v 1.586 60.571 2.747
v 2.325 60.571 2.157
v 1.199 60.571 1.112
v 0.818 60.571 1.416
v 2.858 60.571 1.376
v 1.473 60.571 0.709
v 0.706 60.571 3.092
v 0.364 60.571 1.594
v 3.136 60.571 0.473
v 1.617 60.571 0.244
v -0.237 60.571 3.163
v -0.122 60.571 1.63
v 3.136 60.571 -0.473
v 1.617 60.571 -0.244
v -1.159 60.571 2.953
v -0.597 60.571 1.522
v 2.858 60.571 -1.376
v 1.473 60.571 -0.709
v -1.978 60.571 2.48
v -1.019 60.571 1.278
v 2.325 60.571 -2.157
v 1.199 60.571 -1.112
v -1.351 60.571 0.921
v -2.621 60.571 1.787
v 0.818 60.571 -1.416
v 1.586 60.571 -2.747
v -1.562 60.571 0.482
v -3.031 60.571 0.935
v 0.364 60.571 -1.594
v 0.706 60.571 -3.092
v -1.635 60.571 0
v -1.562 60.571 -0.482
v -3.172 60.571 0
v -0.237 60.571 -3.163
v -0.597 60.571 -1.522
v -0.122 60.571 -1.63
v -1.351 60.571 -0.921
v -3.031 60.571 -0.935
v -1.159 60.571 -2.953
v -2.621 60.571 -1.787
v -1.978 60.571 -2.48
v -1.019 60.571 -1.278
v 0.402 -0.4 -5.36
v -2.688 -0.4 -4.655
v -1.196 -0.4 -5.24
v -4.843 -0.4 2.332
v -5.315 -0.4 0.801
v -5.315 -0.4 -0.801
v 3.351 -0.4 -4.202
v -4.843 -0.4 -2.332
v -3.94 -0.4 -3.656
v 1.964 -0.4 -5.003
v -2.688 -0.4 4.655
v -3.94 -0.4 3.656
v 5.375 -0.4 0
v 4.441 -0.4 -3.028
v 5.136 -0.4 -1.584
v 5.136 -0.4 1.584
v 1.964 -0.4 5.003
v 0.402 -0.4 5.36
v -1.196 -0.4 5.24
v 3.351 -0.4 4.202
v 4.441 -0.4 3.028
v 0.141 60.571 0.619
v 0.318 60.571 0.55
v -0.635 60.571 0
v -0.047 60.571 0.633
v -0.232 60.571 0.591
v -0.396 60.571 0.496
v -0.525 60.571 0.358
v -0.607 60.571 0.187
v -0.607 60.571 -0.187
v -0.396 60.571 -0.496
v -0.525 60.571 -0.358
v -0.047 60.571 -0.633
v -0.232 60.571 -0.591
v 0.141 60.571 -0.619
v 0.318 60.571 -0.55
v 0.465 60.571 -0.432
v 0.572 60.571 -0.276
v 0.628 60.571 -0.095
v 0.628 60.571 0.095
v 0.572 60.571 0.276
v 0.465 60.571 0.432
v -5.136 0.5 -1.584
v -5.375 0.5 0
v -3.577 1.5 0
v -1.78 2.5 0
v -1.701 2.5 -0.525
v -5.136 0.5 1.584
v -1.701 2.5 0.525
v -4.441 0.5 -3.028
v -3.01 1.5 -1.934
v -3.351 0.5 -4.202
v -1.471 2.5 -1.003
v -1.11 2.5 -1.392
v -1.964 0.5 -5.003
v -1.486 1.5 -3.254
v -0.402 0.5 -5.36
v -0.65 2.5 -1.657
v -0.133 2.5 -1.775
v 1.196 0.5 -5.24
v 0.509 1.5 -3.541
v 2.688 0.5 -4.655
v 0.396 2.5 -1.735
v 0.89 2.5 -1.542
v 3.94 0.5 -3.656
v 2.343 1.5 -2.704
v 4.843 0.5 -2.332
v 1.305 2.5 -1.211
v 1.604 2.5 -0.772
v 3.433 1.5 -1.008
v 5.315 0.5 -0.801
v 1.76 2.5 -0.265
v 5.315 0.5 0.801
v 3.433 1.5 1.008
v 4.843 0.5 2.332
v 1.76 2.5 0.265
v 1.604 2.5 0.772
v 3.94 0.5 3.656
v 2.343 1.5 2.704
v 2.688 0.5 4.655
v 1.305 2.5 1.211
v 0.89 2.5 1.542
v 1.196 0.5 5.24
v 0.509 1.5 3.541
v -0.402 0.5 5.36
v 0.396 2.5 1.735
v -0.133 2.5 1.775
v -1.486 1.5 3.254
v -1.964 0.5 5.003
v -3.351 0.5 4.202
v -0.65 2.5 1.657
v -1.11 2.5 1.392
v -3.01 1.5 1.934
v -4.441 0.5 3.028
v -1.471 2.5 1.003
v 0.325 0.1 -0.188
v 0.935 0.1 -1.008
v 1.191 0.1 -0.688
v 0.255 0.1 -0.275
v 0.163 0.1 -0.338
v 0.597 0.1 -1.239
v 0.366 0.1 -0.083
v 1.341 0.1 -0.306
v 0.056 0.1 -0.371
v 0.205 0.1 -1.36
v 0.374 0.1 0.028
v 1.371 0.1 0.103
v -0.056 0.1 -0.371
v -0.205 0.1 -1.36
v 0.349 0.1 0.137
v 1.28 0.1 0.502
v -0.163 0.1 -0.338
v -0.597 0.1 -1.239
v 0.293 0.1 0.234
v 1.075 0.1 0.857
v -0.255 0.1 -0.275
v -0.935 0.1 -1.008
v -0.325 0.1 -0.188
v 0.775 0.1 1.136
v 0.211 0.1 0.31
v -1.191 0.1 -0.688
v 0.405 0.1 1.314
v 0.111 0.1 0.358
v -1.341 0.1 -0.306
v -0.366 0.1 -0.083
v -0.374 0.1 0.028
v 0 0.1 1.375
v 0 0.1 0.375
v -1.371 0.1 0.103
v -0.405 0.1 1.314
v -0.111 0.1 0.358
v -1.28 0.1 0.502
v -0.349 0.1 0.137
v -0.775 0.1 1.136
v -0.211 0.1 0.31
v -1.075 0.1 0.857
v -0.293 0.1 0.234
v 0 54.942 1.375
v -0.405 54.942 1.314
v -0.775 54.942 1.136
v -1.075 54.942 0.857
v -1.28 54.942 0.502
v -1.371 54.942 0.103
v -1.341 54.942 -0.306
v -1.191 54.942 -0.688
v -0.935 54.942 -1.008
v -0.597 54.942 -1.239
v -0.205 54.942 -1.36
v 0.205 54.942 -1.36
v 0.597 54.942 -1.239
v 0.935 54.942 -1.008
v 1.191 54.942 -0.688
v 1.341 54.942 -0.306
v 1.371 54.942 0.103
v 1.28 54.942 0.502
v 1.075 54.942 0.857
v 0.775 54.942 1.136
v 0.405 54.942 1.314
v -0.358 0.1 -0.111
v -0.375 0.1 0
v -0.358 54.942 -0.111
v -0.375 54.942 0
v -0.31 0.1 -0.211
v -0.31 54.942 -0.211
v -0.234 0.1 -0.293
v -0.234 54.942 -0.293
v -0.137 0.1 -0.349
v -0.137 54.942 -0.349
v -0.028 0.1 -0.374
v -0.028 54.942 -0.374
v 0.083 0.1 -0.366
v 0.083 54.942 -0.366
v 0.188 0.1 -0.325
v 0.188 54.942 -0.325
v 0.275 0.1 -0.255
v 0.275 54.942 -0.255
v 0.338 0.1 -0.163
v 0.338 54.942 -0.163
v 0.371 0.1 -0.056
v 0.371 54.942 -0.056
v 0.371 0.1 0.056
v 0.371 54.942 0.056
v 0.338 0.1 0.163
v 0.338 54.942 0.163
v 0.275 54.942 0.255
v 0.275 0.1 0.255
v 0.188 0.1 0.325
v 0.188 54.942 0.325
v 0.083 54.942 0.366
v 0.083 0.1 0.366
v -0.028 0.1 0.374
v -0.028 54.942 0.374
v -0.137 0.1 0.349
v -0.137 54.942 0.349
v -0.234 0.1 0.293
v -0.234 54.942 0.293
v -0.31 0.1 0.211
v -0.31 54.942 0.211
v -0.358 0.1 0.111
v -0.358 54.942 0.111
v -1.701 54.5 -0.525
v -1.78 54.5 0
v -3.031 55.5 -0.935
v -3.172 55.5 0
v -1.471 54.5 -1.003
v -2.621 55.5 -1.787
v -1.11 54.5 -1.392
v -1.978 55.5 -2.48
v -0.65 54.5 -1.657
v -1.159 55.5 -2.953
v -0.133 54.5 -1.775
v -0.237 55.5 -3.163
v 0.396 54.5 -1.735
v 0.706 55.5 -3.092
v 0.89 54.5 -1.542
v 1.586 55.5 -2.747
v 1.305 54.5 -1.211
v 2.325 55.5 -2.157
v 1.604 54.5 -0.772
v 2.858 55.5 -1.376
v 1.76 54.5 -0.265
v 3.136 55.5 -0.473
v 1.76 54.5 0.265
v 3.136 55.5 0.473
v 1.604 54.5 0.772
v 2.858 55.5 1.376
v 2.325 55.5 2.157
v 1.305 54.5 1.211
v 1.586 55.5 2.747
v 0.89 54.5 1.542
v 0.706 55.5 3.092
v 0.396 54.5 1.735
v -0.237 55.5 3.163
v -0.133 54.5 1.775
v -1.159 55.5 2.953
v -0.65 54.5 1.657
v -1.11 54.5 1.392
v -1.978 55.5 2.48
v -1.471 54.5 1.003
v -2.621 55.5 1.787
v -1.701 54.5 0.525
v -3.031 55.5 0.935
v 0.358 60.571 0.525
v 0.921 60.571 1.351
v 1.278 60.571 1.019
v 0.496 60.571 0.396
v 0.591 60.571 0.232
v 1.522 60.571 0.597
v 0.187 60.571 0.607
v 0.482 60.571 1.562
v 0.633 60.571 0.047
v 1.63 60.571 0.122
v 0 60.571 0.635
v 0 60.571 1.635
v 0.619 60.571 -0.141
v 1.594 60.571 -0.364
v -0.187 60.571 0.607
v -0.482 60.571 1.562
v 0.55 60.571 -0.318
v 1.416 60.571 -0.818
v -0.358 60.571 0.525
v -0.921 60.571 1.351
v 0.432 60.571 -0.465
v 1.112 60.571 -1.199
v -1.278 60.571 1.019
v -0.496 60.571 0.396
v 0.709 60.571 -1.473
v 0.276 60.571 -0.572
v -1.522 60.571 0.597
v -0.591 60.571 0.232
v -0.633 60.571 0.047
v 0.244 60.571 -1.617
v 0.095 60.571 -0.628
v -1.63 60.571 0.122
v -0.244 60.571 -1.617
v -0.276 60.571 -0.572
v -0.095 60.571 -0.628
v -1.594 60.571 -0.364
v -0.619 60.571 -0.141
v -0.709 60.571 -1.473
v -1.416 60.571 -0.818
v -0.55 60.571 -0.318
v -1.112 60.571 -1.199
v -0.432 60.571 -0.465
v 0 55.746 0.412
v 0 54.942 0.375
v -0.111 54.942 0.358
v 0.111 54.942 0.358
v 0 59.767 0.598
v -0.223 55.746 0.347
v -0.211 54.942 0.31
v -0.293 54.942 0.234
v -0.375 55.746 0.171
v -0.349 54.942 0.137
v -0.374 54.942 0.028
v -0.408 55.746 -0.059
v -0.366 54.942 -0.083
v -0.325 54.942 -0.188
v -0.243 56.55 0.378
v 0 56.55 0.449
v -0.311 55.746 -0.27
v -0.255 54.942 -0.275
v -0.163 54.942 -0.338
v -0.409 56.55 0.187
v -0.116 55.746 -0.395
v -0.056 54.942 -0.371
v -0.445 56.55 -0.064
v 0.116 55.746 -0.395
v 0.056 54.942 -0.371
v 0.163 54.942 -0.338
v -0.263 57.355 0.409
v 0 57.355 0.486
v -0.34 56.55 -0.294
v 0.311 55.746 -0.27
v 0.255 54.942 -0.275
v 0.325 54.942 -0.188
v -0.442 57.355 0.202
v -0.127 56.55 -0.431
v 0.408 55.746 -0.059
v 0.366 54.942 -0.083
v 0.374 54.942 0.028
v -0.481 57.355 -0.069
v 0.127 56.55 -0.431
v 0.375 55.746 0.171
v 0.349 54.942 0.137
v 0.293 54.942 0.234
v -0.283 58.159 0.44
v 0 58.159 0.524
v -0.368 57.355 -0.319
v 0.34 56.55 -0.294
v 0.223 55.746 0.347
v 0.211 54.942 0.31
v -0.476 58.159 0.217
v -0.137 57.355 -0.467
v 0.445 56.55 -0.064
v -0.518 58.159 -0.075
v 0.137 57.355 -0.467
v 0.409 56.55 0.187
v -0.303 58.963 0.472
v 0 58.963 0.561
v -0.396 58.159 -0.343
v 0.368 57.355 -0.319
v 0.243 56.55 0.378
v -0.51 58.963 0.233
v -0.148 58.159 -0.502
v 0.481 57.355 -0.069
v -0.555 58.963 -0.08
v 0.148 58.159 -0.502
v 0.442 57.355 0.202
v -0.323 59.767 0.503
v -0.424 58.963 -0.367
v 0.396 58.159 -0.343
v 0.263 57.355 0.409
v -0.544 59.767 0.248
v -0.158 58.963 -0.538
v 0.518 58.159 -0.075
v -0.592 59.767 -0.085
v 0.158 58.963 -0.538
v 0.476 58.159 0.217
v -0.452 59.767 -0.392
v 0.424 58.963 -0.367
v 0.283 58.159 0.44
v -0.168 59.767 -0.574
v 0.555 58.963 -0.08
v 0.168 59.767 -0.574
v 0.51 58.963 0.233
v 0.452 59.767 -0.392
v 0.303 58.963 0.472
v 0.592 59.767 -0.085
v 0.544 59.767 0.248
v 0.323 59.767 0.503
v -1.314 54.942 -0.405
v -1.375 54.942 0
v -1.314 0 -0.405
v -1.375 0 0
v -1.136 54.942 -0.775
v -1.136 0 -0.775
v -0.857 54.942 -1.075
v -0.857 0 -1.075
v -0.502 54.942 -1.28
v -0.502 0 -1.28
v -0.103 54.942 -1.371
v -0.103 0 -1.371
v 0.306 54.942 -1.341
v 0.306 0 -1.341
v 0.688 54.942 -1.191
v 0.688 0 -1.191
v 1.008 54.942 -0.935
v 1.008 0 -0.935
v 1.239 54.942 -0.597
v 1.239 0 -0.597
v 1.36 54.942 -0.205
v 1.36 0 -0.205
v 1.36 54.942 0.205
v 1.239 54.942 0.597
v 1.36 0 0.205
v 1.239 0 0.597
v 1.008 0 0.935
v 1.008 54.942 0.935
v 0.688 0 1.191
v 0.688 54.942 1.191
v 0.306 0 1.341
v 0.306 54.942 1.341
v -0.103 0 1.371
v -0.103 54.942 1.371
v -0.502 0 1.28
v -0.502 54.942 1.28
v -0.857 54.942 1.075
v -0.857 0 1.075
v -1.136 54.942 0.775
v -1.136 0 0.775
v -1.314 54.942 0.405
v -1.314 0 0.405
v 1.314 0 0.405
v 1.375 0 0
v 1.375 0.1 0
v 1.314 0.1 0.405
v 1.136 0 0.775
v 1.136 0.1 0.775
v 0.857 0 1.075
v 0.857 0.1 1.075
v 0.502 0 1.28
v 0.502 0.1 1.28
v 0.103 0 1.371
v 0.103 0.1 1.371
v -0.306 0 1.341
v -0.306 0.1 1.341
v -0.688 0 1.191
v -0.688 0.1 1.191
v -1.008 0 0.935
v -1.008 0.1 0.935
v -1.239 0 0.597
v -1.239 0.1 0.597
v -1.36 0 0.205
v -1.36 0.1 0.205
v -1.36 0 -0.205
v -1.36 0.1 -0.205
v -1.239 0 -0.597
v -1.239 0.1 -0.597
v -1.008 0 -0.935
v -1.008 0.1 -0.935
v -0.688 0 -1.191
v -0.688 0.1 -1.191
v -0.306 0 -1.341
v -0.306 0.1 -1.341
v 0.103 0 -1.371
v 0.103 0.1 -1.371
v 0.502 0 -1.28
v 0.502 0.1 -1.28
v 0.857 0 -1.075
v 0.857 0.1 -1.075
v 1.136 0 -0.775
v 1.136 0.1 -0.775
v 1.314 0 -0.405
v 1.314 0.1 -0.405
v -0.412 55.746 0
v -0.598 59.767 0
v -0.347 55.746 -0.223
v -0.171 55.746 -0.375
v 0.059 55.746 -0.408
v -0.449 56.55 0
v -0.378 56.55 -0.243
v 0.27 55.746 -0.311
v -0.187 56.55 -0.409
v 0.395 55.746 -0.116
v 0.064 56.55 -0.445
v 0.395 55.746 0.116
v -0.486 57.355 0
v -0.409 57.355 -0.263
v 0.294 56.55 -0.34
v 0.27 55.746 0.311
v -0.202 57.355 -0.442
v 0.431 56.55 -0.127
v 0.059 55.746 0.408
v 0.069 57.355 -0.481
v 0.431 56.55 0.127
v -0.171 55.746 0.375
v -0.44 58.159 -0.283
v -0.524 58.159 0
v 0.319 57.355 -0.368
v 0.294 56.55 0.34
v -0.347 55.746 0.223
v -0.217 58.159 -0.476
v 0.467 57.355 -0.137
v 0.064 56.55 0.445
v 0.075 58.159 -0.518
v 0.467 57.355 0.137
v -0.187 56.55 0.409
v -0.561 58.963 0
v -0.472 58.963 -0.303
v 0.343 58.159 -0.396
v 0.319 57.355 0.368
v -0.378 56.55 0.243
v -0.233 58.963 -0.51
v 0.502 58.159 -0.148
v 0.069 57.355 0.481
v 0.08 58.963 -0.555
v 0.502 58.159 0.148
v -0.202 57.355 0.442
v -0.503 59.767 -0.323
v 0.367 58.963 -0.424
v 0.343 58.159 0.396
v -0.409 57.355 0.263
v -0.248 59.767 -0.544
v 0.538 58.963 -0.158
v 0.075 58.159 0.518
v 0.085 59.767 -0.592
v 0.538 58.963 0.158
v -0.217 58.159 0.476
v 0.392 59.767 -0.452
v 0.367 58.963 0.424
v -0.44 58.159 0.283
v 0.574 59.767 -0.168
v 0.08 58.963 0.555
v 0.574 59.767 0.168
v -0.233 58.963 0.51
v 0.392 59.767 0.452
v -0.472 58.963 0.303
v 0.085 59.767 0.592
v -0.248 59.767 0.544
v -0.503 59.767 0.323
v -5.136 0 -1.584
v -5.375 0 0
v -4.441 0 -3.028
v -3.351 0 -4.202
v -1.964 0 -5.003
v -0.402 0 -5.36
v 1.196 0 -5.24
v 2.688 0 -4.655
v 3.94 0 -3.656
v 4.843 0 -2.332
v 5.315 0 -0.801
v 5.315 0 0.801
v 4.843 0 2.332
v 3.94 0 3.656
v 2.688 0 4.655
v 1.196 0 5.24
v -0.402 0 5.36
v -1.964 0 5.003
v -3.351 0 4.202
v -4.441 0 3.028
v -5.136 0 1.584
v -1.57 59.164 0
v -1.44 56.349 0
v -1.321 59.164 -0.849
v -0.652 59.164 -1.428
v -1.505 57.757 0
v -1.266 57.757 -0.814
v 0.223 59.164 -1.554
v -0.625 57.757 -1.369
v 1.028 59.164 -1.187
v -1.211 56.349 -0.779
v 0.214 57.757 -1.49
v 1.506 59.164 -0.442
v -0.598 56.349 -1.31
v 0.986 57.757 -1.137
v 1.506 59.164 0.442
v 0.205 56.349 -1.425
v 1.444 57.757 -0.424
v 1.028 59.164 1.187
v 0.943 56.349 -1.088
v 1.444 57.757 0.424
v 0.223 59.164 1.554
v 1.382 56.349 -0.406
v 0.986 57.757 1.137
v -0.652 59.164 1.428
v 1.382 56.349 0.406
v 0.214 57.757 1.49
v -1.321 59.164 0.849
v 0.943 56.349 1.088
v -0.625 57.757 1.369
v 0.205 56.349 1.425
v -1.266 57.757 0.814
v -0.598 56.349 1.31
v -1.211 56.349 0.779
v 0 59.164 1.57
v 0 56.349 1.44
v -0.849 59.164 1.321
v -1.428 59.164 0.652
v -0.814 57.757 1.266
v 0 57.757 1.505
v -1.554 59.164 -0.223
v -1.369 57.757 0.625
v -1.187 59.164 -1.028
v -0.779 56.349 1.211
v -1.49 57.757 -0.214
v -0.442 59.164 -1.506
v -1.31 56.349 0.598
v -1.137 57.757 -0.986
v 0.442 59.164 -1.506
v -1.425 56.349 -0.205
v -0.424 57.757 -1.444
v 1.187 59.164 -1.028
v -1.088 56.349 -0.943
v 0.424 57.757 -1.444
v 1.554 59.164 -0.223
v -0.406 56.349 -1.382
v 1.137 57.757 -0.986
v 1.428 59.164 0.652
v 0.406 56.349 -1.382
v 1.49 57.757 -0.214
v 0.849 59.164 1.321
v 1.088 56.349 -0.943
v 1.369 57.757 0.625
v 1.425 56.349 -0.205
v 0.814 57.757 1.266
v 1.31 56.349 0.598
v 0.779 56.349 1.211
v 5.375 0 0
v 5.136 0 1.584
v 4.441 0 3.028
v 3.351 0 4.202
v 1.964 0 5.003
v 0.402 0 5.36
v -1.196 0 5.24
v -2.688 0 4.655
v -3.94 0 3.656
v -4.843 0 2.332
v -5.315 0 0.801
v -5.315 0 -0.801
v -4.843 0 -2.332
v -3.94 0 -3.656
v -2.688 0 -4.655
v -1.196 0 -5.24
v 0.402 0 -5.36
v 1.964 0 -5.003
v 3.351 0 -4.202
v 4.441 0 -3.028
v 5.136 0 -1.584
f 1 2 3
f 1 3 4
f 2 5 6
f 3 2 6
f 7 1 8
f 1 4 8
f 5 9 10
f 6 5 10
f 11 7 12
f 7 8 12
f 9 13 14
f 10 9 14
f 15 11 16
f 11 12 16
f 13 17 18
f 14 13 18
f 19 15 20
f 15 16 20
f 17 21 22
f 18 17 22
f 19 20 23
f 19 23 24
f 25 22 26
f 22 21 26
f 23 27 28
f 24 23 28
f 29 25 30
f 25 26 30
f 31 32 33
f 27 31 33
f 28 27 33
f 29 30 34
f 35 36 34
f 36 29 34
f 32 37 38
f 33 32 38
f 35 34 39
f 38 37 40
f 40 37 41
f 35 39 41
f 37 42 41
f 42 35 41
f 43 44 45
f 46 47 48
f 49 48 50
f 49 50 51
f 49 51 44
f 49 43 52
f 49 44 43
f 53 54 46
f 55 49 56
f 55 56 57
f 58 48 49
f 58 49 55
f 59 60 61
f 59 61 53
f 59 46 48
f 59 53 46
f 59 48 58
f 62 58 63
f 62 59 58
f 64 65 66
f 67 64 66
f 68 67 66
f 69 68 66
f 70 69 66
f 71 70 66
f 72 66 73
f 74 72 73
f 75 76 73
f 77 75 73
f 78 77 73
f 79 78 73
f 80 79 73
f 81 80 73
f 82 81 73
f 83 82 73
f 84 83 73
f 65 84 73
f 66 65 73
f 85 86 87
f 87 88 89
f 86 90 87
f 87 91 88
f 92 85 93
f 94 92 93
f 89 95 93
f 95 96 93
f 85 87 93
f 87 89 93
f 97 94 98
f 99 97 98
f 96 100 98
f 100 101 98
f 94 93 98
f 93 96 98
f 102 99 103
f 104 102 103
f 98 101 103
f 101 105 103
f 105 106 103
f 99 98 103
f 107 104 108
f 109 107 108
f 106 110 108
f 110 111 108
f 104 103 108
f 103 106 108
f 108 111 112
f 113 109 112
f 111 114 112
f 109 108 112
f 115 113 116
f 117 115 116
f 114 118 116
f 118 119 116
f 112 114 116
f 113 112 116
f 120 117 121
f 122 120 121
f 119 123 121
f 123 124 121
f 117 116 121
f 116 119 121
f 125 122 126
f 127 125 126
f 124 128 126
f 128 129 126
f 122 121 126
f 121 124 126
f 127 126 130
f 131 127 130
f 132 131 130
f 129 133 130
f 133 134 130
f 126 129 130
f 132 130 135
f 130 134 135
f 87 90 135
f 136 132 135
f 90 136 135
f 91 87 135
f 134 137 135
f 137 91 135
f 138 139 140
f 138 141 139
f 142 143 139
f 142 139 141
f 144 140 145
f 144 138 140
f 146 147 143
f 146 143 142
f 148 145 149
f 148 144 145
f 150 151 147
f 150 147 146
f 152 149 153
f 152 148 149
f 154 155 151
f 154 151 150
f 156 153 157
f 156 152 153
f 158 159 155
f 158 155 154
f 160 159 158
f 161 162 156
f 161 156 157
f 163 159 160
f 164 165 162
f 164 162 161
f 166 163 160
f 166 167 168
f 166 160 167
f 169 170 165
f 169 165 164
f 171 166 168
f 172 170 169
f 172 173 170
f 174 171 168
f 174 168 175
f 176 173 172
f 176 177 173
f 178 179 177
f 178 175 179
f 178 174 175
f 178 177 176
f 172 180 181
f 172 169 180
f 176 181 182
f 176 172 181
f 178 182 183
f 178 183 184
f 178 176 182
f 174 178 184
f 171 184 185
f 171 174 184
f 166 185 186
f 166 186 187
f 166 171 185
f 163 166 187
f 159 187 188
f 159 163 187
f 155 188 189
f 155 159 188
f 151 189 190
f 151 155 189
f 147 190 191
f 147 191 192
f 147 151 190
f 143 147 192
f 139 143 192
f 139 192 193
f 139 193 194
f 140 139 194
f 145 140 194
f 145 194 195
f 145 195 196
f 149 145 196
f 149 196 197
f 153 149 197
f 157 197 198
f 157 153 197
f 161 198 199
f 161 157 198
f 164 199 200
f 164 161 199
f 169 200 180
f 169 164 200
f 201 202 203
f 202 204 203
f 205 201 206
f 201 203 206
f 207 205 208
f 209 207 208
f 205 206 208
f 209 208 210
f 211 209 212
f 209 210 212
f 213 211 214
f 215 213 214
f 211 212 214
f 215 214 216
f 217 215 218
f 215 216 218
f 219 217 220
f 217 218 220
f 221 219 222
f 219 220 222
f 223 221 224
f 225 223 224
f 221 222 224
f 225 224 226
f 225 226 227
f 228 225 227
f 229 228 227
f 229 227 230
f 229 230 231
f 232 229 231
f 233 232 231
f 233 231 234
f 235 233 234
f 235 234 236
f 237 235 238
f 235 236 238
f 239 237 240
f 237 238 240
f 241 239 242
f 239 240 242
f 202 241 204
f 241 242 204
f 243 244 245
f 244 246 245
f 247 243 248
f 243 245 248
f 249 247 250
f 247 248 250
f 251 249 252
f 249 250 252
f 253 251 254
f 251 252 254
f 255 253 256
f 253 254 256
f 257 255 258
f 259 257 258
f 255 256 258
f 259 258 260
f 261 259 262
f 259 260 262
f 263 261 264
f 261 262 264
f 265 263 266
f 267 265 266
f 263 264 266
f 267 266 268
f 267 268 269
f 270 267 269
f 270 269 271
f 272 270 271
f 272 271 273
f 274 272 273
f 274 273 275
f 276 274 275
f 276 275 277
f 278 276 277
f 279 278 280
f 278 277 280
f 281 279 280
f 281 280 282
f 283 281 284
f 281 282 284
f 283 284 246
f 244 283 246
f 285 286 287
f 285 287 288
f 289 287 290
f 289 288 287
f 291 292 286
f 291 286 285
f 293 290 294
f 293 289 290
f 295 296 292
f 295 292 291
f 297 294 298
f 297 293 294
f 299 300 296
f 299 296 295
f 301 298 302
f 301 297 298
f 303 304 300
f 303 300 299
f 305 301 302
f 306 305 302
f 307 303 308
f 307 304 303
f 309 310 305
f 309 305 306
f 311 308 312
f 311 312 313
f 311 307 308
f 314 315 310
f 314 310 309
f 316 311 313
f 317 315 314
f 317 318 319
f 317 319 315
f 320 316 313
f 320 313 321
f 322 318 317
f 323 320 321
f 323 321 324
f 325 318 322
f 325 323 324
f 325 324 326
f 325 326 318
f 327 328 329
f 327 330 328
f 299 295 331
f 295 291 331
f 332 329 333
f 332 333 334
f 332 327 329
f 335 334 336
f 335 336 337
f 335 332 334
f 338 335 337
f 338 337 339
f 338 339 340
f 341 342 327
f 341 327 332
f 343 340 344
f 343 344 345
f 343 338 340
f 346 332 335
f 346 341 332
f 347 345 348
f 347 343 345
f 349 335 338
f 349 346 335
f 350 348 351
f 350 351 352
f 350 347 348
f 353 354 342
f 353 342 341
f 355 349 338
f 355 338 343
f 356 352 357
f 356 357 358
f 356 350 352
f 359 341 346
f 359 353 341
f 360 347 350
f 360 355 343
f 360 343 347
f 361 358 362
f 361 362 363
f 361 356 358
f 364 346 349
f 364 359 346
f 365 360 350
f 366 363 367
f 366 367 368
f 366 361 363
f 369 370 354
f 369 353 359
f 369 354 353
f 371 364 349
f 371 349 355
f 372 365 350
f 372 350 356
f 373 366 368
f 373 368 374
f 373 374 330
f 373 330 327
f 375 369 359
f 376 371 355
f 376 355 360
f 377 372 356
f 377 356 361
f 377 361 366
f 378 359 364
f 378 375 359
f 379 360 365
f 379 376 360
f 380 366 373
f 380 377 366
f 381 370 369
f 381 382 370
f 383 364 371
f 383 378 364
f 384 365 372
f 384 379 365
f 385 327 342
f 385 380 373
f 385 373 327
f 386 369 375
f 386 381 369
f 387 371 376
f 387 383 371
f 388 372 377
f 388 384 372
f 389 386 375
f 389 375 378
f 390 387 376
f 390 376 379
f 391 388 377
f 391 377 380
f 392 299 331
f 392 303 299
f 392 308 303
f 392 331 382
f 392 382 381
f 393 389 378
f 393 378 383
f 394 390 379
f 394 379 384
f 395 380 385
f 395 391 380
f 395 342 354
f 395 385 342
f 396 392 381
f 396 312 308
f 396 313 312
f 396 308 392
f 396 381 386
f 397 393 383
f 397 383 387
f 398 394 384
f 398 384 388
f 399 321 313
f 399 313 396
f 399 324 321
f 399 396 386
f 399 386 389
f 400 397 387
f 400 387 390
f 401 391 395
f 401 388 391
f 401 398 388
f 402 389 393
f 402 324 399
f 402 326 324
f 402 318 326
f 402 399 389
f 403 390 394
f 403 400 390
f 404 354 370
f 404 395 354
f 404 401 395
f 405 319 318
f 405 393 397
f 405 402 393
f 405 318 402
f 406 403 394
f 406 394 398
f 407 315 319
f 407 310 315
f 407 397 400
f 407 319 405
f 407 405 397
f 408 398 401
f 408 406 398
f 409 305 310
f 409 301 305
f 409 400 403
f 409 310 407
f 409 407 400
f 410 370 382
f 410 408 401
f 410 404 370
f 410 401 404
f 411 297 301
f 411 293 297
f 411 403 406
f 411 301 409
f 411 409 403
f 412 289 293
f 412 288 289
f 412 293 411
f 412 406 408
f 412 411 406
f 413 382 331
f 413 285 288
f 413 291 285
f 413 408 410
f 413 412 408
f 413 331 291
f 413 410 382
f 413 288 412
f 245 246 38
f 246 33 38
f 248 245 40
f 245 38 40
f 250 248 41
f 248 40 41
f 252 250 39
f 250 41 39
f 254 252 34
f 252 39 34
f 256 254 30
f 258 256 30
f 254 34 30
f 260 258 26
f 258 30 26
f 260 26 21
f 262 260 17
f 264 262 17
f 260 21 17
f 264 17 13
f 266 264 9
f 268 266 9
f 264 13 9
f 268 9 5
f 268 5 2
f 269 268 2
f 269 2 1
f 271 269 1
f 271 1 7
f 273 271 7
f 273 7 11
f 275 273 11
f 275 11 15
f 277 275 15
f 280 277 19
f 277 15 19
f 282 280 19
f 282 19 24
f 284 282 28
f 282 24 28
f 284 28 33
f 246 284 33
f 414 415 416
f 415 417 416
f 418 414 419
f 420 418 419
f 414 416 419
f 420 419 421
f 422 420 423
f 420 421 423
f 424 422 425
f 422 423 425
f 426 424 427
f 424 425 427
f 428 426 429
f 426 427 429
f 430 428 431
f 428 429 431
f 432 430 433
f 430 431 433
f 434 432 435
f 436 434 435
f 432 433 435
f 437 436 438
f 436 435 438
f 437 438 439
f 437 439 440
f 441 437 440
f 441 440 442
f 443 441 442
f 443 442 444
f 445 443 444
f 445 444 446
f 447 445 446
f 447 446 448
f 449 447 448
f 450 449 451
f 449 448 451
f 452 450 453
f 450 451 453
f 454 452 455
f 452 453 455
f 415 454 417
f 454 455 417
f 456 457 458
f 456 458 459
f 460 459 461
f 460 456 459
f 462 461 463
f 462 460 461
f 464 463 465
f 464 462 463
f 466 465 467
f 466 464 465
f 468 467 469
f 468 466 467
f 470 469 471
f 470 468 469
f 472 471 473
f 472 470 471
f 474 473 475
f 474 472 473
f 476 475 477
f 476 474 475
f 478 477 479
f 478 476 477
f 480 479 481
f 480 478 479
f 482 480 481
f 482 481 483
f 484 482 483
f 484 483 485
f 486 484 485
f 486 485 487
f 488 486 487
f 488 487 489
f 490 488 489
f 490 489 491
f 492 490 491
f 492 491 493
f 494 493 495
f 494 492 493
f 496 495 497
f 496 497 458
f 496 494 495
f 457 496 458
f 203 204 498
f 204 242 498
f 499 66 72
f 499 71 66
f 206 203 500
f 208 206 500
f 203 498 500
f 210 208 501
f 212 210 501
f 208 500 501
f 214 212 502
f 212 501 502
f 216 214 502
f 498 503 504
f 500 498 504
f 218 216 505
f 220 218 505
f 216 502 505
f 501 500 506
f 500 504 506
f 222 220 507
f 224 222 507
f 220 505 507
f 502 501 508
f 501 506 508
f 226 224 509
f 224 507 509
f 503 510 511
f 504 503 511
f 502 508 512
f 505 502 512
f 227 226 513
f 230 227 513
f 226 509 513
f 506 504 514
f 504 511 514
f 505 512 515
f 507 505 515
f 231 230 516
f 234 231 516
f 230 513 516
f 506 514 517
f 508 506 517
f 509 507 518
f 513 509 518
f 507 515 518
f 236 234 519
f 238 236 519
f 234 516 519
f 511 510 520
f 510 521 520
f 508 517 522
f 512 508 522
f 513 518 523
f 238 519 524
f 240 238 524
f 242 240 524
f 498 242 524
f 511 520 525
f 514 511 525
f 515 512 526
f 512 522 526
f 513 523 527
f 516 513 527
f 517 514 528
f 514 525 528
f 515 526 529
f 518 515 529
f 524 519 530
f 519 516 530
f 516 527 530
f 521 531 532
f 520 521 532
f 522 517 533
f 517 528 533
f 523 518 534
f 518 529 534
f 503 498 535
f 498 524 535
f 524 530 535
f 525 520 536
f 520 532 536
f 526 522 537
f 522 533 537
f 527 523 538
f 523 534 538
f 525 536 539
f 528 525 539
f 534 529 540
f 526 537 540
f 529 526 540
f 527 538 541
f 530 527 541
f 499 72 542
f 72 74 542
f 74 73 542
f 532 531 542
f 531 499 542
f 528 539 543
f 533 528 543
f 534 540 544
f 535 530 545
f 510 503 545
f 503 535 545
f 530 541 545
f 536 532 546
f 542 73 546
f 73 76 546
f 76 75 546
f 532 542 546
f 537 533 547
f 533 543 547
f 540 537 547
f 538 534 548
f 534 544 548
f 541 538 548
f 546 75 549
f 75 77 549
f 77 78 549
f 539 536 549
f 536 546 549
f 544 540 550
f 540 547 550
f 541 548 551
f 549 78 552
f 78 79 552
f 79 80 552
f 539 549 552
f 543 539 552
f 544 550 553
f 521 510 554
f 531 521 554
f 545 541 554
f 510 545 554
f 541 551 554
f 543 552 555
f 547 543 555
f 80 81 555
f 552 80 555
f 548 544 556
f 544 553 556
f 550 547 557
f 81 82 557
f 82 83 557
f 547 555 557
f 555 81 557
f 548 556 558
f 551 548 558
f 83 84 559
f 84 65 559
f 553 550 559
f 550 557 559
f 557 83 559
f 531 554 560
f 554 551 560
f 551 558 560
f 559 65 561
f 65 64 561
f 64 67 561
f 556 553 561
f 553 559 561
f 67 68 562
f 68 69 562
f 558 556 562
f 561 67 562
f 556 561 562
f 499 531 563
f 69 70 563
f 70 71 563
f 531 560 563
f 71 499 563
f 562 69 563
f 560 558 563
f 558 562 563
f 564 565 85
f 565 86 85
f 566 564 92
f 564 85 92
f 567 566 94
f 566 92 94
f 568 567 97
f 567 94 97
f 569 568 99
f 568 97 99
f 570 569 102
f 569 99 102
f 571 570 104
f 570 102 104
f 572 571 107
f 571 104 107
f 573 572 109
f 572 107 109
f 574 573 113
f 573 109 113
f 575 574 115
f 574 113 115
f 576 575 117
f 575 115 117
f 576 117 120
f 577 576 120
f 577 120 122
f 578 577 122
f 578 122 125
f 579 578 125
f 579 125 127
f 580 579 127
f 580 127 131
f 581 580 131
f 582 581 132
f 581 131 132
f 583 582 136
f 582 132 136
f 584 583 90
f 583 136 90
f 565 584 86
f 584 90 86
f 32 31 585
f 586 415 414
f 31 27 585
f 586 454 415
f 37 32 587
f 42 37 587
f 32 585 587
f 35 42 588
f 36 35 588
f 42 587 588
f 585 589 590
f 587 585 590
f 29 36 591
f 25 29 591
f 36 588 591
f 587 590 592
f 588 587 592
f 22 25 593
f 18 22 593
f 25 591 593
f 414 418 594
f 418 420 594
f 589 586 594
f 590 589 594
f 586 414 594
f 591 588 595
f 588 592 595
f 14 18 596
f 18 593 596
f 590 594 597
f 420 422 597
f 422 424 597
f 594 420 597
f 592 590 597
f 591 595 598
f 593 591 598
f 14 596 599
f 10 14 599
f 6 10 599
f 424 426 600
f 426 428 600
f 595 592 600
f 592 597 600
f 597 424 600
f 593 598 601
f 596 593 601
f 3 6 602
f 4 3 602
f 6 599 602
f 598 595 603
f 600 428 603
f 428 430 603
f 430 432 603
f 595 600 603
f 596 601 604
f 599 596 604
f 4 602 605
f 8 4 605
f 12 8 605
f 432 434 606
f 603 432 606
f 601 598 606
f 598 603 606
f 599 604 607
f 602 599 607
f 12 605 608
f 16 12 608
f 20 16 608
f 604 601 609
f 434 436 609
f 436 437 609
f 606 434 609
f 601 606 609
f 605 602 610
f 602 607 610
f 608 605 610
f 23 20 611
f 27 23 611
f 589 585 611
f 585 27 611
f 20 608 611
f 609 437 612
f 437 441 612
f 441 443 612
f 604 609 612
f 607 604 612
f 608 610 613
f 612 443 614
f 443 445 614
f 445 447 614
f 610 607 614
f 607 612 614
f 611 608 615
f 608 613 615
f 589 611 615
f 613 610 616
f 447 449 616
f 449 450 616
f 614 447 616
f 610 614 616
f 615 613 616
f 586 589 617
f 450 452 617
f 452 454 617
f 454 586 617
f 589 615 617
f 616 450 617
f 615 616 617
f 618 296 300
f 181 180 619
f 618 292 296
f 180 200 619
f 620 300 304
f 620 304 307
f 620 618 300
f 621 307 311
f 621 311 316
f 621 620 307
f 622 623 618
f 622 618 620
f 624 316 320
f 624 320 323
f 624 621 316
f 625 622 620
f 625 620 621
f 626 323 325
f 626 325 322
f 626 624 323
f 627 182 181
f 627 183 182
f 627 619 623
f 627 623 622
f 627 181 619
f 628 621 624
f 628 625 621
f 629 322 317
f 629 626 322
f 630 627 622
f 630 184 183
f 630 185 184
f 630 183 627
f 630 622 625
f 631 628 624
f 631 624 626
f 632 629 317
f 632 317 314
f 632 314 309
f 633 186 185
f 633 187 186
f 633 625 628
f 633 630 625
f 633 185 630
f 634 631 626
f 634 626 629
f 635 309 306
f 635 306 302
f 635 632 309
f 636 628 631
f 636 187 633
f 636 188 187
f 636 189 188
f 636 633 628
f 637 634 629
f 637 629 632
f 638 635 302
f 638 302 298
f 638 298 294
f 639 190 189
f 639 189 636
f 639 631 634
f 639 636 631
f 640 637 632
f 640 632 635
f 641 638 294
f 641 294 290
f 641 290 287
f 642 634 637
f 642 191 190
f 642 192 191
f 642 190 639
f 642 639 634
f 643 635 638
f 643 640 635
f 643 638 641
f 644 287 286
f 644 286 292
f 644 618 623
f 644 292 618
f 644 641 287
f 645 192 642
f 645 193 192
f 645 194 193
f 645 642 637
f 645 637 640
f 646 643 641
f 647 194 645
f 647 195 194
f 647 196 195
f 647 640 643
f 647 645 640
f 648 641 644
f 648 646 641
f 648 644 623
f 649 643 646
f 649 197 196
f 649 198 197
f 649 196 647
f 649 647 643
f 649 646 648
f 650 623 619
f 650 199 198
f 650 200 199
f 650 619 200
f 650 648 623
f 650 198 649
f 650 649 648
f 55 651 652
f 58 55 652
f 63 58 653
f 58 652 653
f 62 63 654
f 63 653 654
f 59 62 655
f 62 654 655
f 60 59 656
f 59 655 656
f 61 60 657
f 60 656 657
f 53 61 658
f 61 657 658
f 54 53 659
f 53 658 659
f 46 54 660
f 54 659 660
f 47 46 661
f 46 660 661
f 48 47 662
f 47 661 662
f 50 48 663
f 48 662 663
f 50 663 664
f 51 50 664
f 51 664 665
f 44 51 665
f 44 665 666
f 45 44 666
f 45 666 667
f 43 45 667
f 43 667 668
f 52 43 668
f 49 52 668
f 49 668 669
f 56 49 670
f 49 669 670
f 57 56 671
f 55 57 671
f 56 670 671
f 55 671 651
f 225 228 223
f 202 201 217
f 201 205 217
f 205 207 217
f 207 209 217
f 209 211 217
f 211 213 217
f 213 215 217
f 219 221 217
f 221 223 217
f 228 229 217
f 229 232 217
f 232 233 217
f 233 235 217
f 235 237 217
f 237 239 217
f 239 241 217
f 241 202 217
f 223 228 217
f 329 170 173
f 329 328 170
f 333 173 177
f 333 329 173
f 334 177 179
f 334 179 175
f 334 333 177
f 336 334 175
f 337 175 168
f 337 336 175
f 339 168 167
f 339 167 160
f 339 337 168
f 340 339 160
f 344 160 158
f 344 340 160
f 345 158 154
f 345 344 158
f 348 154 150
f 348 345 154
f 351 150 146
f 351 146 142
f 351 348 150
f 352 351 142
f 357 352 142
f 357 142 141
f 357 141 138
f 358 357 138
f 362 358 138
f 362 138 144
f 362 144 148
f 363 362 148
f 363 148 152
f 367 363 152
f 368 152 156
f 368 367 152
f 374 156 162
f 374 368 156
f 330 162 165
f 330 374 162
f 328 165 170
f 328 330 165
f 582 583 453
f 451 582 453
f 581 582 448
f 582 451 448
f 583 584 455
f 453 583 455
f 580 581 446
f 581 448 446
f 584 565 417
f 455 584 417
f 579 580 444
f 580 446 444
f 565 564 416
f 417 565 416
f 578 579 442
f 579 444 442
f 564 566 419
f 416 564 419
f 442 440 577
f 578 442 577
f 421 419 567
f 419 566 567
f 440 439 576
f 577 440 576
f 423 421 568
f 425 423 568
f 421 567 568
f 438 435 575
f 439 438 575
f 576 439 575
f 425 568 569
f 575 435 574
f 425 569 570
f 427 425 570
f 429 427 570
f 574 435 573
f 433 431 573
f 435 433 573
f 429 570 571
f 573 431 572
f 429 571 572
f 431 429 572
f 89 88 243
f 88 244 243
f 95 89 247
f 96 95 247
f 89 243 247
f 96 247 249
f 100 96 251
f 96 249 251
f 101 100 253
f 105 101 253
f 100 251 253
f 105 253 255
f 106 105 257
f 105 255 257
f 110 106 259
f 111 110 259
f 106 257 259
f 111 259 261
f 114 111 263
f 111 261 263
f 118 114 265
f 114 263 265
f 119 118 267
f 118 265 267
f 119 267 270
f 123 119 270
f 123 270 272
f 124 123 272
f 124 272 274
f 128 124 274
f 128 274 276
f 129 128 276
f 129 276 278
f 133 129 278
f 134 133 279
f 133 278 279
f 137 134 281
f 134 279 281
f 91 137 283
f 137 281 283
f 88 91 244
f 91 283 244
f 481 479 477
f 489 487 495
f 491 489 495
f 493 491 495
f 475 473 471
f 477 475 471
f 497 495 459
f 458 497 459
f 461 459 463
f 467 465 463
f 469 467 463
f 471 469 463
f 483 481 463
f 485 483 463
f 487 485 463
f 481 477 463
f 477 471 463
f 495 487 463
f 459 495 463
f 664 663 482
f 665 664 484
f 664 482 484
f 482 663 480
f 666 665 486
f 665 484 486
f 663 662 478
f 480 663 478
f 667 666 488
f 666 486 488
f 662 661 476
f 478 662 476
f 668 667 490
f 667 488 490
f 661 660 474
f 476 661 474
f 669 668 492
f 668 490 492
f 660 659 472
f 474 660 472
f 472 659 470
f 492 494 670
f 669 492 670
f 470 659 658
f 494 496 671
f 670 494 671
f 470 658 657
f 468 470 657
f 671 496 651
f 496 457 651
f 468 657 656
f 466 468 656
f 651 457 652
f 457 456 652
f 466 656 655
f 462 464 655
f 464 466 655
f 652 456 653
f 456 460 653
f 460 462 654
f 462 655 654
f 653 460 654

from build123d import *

# Parameters (mm, degrees)
CROQUIS4_R              = 1.375
SALIENTE_EXTRUIR1_DEPTH = 0.1
CROQUIS5_R              = 5.375
SALIENTE_EXTRUIR2_DEPTH = 0.4


with BuildPart() as part:
    # Croquis1 → Revolución1 (revolve)
    with BuildSketch(Plane.XY, mode=Mode.PRIVATE) as revoluci_n1_sk:
        Polygon((5.375, 0), (5.375, 0.5), (1.78, 2.5), (1.78, 54.5), (3.171785891, 55.5), (3.171785891, 60.571), (1.635, 60.571), (1.375, 54.942193309), (1.375, 0), align=None)
        Polygon((0.375, 0.1), (0.375, 54.942193309), (0.635, 60.571), (0.442390715, 60.571), (0, 60.571), (0, 0.1), align=None)
    revolve(revoluci_n1_sk.sketch.rotate(Axis((0, 60.571, 0), (0, -1, 0)), 180), axis=Axis((0, 60.571, 0), (0, -1, 0)))


with BuildPart() as body_2:
    # Croquis3 → Revolución2 (revolve)
    with BuildSketch(Plane.XY, mode=Mode.PRIVATE) as revoluci_n2_sk:
        Polygon((0.375, 54.942193309), (0.635, 60.571), (1.635, 60.571), (1.375, 54.942193309), (1.375, 0.1), (0.375, 0.1), align=None)
    revolve(revoluci_n2_sk.sketch.rotate(Axis((0, 55.5, 0), (0, -1, 0)), 90), axis=Axis((0, 55.5, 0), (0, -1, 0)))


with BuildPart() as body_3:
    # Croquis4 → Saliente-Extruir1 (new body)
    with BuildSketch(Plane.XZ):
        Circle(CROQUIS4_R)
    extrude(amount=-SALIENTE_EXTRUIR1_DEPTH)

    # Croquis5 → Saliente-Extruir2 (add)
    with BuildSketch(Plane.XZ):
        Circle(CROQUIS5_R)
    extrude(amount=SALIENTE_EXTRUIR2_DEPTH)


solid = Compound([part.part, body_2.part, body_3.part])
